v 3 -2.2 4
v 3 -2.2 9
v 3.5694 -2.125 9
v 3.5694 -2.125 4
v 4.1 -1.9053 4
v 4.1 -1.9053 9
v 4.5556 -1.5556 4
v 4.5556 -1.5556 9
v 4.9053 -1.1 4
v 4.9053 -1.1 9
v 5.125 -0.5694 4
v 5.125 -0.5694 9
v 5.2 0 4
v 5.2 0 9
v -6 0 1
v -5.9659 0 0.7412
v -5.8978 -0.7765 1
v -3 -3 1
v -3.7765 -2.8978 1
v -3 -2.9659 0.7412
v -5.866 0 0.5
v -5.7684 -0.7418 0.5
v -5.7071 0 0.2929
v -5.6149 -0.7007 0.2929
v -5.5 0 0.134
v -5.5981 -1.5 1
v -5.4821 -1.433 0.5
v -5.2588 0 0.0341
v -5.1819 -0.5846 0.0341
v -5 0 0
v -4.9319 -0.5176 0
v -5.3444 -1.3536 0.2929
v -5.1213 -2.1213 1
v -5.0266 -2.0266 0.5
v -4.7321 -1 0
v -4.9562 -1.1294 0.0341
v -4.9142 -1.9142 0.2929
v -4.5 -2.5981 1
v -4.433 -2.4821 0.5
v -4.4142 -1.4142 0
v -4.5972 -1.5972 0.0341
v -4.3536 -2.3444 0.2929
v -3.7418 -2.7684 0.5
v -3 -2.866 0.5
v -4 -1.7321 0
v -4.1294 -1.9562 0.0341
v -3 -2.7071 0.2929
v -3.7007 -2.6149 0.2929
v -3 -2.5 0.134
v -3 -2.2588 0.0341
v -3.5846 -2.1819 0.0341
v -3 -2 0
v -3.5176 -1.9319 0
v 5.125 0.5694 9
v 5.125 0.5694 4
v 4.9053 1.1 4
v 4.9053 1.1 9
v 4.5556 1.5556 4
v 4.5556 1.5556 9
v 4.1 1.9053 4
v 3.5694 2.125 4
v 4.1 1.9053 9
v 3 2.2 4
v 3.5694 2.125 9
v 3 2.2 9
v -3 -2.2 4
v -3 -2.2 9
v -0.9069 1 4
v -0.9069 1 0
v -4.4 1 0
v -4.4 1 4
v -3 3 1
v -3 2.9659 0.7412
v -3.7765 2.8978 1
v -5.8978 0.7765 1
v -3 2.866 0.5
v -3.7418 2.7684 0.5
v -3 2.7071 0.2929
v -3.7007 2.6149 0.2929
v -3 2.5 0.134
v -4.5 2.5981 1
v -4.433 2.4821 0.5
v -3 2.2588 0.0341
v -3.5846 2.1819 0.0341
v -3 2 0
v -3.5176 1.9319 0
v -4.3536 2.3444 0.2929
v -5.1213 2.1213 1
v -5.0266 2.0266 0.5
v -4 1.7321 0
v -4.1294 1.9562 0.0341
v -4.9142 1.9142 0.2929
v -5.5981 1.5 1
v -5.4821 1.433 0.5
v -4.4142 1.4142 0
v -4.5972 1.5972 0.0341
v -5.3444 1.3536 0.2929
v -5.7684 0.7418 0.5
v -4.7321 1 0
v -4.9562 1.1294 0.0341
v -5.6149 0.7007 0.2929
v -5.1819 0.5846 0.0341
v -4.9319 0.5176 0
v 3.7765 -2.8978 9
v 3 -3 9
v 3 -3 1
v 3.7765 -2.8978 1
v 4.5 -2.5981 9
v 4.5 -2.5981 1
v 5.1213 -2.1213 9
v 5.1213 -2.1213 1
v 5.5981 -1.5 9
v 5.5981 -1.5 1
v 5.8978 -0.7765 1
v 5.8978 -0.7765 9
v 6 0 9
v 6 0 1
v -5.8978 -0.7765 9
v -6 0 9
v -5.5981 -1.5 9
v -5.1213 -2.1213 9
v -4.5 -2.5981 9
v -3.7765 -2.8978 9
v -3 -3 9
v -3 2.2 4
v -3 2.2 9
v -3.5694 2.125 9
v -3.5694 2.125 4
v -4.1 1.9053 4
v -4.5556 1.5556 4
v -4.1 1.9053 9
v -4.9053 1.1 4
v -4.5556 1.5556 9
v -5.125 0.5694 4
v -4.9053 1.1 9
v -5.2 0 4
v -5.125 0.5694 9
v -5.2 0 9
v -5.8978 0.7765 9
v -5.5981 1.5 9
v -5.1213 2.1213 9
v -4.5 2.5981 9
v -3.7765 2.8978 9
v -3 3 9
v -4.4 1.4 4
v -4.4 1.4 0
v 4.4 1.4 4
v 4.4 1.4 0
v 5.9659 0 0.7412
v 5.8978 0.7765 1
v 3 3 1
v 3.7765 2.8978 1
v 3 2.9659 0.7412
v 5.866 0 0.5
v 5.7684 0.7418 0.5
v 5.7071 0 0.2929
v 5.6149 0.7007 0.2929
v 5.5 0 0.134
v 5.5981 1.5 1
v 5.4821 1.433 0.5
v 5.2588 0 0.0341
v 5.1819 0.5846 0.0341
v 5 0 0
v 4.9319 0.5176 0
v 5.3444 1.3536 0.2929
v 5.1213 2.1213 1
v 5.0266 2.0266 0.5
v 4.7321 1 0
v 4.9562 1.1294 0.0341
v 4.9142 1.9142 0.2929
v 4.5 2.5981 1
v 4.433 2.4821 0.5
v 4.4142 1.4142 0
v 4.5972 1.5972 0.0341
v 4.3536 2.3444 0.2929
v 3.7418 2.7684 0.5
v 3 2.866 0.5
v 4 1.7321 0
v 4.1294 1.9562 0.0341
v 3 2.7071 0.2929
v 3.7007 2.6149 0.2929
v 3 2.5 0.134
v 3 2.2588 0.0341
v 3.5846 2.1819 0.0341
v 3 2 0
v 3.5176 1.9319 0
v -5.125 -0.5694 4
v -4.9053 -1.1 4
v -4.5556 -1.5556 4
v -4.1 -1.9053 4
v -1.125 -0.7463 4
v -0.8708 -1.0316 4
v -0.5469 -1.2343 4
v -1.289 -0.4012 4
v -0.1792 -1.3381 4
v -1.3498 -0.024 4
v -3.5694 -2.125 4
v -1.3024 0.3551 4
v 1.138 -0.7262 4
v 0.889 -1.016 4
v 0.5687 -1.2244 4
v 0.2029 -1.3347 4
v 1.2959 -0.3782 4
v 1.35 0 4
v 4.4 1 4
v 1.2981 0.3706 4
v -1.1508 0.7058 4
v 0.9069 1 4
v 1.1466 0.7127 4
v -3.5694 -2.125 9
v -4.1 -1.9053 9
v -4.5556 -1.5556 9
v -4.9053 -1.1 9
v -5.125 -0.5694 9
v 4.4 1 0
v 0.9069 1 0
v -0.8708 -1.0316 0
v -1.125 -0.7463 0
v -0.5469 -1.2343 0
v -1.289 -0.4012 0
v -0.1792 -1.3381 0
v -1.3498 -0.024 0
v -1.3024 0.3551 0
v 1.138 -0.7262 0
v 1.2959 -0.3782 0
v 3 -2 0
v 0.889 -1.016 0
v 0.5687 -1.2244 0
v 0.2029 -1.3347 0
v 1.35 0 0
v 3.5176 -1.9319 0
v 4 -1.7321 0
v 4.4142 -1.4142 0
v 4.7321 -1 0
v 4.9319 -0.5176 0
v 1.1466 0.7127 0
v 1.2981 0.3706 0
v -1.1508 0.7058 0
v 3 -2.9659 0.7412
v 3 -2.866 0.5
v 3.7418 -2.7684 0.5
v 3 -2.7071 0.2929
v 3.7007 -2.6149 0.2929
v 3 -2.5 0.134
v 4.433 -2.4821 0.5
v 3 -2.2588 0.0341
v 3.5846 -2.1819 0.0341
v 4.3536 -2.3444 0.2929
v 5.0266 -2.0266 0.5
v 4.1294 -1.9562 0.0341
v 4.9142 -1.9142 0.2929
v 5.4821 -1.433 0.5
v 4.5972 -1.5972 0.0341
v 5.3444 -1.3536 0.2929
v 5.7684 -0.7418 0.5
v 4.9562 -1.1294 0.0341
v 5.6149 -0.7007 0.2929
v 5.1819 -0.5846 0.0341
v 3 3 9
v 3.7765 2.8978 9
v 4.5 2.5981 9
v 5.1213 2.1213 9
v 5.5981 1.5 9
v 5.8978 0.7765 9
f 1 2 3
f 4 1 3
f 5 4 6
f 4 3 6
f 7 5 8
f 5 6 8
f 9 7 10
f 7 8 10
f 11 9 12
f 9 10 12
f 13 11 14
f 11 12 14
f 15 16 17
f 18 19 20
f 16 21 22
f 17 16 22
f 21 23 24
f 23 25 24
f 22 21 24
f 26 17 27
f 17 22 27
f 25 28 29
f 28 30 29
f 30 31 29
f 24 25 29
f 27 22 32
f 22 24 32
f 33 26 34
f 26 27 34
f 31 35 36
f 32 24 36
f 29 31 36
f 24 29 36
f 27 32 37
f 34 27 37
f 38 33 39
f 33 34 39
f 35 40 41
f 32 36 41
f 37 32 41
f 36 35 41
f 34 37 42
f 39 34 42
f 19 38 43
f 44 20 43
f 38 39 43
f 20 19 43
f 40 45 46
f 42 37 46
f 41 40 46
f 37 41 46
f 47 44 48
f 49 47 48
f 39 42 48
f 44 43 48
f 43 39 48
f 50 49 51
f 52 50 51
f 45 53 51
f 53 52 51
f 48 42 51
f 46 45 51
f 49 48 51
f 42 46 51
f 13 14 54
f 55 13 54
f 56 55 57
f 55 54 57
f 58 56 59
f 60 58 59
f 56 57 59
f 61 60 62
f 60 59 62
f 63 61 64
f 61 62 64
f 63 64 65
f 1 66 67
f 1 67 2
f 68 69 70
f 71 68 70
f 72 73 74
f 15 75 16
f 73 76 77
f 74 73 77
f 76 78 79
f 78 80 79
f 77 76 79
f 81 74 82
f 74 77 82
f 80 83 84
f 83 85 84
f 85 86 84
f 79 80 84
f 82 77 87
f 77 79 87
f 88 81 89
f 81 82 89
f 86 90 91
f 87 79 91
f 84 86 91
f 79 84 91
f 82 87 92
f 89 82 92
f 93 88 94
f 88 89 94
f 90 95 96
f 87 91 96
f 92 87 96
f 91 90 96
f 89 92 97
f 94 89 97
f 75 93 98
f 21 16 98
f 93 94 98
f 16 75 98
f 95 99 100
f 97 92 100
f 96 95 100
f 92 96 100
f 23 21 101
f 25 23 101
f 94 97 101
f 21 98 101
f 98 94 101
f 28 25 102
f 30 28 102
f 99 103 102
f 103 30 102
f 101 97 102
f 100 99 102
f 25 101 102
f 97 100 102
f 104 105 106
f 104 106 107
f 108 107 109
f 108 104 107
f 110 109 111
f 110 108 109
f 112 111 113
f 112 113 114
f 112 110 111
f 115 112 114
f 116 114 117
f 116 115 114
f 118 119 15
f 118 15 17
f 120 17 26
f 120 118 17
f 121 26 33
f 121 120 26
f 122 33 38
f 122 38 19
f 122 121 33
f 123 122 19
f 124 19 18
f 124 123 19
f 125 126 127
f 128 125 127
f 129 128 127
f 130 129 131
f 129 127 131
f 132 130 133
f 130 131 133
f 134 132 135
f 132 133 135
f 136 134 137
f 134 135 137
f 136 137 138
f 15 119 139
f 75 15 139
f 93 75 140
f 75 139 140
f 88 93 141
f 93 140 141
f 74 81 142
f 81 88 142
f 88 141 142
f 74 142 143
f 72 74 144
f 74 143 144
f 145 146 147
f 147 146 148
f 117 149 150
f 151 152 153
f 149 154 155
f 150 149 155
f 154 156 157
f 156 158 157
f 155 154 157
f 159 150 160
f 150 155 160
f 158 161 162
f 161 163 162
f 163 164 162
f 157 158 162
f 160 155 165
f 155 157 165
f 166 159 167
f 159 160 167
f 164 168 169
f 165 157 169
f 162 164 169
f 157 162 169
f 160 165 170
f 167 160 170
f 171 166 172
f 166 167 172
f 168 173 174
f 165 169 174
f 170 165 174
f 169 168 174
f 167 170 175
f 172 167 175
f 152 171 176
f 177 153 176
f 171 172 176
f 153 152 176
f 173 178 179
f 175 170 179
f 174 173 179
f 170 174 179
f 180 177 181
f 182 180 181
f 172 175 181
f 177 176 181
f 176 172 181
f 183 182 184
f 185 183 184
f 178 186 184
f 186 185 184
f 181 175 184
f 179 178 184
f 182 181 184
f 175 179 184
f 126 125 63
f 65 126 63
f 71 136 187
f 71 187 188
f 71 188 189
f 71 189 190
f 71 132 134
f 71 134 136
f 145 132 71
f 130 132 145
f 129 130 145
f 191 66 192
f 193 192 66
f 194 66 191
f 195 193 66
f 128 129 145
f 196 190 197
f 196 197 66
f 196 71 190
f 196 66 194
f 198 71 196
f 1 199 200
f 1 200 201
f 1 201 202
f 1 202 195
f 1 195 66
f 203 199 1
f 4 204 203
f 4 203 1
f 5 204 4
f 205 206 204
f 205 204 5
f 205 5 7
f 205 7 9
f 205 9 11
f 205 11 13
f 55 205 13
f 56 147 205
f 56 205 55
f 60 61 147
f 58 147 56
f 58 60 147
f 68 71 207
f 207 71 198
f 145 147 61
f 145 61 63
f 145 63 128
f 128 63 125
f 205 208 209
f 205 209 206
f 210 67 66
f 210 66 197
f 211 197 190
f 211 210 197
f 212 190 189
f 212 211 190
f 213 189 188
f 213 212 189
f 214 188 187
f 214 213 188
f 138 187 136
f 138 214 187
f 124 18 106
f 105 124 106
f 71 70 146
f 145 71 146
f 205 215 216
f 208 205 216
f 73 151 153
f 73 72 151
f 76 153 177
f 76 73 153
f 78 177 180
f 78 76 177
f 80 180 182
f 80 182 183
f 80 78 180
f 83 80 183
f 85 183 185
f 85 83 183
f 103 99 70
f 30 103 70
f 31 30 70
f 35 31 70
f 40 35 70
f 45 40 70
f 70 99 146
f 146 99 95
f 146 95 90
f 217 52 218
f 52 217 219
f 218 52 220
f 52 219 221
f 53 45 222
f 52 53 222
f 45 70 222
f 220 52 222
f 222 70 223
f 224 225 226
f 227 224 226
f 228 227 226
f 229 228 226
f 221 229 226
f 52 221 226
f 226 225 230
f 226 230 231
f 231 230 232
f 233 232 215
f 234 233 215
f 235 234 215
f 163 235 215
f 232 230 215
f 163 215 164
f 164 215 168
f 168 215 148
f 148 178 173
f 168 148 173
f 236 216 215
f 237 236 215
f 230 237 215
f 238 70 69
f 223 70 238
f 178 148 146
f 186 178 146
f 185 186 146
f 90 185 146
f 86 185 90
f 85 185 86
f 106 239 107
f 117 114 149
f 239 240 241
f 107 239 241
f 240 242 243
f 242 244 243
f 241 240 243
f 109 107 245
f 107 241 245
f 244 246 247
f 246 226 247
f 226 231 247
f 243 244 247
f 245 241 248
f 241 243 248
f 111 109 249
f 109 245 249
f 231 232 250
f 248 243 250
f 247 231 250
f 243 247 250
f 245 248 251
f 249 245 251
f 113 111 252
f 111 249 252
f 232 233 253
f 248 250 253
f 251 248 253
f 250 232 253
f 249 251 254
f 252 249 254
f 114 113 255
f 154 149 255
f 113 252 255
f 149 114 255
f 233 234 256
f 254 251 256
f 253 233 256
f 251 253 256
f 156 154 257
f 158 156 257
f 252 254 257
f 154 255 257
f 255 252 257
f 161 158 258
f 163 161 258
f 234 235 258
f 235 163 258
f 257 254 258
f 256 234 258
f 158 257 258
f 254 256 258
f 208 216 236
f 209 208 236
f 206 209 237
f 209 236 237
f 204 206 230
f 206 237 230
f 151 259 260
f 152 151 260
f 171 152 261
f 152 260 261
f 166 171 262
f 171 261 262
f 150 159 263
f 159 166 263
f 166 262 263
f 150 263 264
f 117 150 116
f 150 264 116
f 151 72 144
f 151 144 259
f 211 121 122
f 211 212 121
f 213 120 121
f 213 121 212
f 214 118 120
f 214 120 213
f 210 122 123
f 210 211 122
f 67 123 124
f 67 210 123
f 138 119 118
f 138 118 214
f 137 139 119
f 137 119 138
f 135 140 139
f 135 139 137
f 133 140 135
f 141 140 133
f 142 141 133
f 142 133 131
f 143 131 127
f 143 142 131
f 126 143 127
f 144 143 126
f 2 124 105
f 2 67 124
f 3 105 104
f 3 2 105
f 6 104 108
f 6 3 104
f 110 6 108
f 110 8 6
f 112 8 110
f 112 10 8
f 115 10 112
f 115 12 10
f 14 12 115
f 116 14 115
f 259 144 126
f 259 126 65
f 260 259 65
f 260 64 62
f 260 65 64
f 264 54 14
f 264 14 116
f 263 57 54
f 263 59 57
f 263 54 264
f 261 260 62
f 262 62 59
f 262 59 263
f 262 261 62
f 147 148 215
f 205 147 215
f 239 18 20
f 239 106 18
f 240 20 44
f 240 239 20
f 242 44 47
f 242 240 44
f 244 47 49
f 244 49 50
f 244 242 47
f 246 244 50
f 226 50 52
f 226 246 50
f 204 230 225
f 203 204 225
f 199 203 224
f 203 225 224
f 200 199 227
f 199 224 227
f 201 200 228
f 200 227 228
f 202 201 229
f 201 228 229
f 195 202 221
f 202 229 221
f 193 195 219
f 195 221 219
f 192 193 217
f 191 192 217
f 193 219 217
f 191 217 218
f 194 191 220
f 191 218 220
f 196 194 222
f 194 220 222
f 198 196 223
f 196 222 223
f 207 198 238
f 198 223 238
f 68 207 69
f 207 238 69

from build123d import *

# Parameters (mm, degrees)
F0_W         = 12
F0_H         = 6
F0_W_2       = 10.4
F0_H_2       = 4.4
F1_DEPTH     = 9
F2_R         = 2.19999
F3_R         = 2.99999
F4_DEPTH     = 4
F5_T4_DEPTH  = 19
F5_S5_R      = 2.99999
F5_T6_DEPTH  = 11
F5_T10_DEPTH = 19
F5_S11_R     = 2.99999
F5_T12_DEPTH = 11
F5_T16_DEPTH = 19
F5_S17_R     = 2.99999
F5_T18_DEPTH = 11
F5_T22_DEPTH = 19
F5_S23_R     = 2.99999
F5_T24_DEPTH = 11
F6_R         = 1


# Not quite as in the source:
# - a fillet or chamfer that OpenCascade refuses, or shapes differently, is made with other operations: its cross-section is extruded or revolved along the edge and cut away or added
# - a fillet or chamfer is up to 0.001 mm smaller than in the source, because OpenCascade refuses the exact size


with BuildPart() as f1:
    # F0 (on Top) → F1 (new body)
    with BuildSketch(Plane.XY):
        Rectangle(F0_W, F0_H)
        Rectangle(F0_W_2, F0_H_2, mode=Mode.SUBTRACT)
    extrude(amount=F1_DEPTH)

    # F2 (radius 2.2 in the source; OpenCascade refuses exactly that, so slightly less here)
    f2_edges = [f1.edges().sort_by_distance(p)[0] for p in [
        (-5.2, 2.2, 4.5),
        (-5.2, -2.2, 4.5),
        (5.2, 2.2, 4.5),
        (5.2, -2.2, 4.5),
    ]]
    fillet(f2_edges, radius=F2_R)

    # F3 (radius 3 in the source; OpenCascade refuses exactly that, so slightly less here)
    f3_edges = [f1.edges().sort_by_distance(p)[0] for p in [
        (-6, 3, 4.5),
        (6, 3, 4.5),
        (-6, -3, 4.5),
        (6, -3, 4.5),
    ]]
    fillet(f3_edges, radius=F3_R)

    # F0 (on Top) → F4 (join)
    with BuildSketch(Plane.XY):
        Rectangle(F0_W_2, F0_H_2)
        with BuildLine():
            Line((-0.9069178574, 1), (-4.4, 1))
            Line((-4.4, 1), (-4.4, 1.4))
            Line((-4.4, 1.4), (4.4, 1.4))
            Line((4.4, 1.4), (4.4, 1))
            Line((4.4, 1), (0.9069178574, 1))
            ThreePointArc((0.9069178574, 1), (1.2342688336, 0.5468824794), (1.35, 0))
            ThreePointArc((1.35, 0), (-0.5468824794, -1.2342688336), (-0.9069178574, 1))
        make_face(mode=Mode.SUBTRACT)
    extrude(amount=F4_DEPTH)

    # F5: fillet of radius 3 on 4 edges, made by hand


with BuildPart() as f5_tool2:
    # F5_s3 → F5_t4 (new body)
    with BuildSketch(Plane.XY.offset(-7.5)):
        with BuildLine():
            ThreePointArc((-2.2, -2.2), (-4.3213203436, -1.3213203436), (-5.2, 0.8))
            Line((-5.2, 0.8), (-5.2, -2.2))
            Line((-5.2, -2.2), (-2.2, -2.2))
        make_face()
    extrude(amount=F5_T4_DEPTH)

    # F5_s5 → F5_t6 (cut, symmetric)
    with BuildSketch(Plane.XY.offset(2)):
        with Locations((-3.00001, -1e-05)):
            Circle(F5_S5_R)
    extrude(amount=F5_T6_DEPTH, both=True, mode=Mode.SUBTRACT)


with BuildPart() as f1_1:
    add(f1.part)

    # F5_t1: cut F5_tool2
    add(f5_tool2.part, mode=Mode.SUBTRACT)


with BuildPart() as f5_tool8:
    # F5_s9 → F5_t10 (new body)
    with BuildSketch(Plane.XY.offset(-7.5)):
        with BuildLine():
            ThreePointArc((5.2, 0.8), (4.3213203436, -1.3213203436), (2.2, -2.2))
            Line((2.2, -2.2), (5.2, -2.2))
            Line((5.2, -2.2), (5.2, 0.8))
        make_face()
    extrude(amount=F5_T10_DEPTH)

    # F5_s11 → F5_t12 (cut, symmetric)
    with BuildSketch(Plane.XY.offset(2)):
        with Locations((3.00001, -1e-05)):
            Circle(F5_S11_R)
    extrude(amount=F5_T12_DEPTH, both=True, mode=Mode.SUBTRACT)


with BuildPart() as f1_2:
    add(f1_1.part)

    # F5_t7: cut F5_tool8
    add(f5_tool8.part, mode=Mode.SUBTRACT)


with BuildPart() as f5_tool14:
    # F5_s15 → F5_t16 (new body)
    with BuildSketch(Plane.XY.offset(-7.5)):
        with BuildLine():
            ThreePointArc((-5.2, -0.8), (-4.3213203436, 1.3213203436), (-2.2, 2.2))
            Line((-2.2, 2.2), (-5.2, 2.2))
            Line((-5.2, 2.2), (-5.2, -0.8))
        make_face()
    extrude(amount=F5_T16_DEPTH)

    # F5_s17 → F5_t18 (cut, symmetric)
    with BuildSketch(Plane.XY.offset(2)):
        with Locations((-3.00001, 1e-05)):
            Circle(F5_S17_R)
    extrude(amount=F5_T18_DEPTH, both=True, mode=Mode.SUBTRACT)


with BuildPart() as f1_3:
    add(f1_2.part)

    # F5_t13: cut F5_tool14
    add(f5_tool14.part, mode=Mode.SUBTRACT)


with BuildPart() as f5_tool20:
    # F5_s21 → F5_t22 (new body)
    with BuildSketch(Plane.XY.offset(-7.5)):
        with BuildLine():
            ThreePointArc((5.2, -0.8), (4.3213203436, 1.3213203436), (2.2, 2.2))
            Line((2.2, 2.2), (5.2, 2.2))
            Line((5.2, 2.2), (5.2, -0.8))
        make_face()
    extrude(amount=F5_T22_DEPTH)

    # F5_s23 → F5_t24 (cut, symmetric)
    with BuildSketch(Plane.XY.offset(2)):
        with Locations((3.00001, 1e-05)):
            Circle(F5_S23_R)
    extrude(amount=F5_T24_DEPTH, both=True, mode=Mode.SUBTRACT)


with BuildPart() as f1_4:
    add(f1_3.part)

    # F5_t19: cut F5_tool20
    add(f5_tool20.part, mode=Mode.SUBTRACT)

    # F6
    f6_edges = [f1_4.edges().sort_by_distance(p)[0] for p in [
        (0, -3, 0),
    ]]
    fillet(f6_edges, radius=F6_R)


solid = f1_4.part
